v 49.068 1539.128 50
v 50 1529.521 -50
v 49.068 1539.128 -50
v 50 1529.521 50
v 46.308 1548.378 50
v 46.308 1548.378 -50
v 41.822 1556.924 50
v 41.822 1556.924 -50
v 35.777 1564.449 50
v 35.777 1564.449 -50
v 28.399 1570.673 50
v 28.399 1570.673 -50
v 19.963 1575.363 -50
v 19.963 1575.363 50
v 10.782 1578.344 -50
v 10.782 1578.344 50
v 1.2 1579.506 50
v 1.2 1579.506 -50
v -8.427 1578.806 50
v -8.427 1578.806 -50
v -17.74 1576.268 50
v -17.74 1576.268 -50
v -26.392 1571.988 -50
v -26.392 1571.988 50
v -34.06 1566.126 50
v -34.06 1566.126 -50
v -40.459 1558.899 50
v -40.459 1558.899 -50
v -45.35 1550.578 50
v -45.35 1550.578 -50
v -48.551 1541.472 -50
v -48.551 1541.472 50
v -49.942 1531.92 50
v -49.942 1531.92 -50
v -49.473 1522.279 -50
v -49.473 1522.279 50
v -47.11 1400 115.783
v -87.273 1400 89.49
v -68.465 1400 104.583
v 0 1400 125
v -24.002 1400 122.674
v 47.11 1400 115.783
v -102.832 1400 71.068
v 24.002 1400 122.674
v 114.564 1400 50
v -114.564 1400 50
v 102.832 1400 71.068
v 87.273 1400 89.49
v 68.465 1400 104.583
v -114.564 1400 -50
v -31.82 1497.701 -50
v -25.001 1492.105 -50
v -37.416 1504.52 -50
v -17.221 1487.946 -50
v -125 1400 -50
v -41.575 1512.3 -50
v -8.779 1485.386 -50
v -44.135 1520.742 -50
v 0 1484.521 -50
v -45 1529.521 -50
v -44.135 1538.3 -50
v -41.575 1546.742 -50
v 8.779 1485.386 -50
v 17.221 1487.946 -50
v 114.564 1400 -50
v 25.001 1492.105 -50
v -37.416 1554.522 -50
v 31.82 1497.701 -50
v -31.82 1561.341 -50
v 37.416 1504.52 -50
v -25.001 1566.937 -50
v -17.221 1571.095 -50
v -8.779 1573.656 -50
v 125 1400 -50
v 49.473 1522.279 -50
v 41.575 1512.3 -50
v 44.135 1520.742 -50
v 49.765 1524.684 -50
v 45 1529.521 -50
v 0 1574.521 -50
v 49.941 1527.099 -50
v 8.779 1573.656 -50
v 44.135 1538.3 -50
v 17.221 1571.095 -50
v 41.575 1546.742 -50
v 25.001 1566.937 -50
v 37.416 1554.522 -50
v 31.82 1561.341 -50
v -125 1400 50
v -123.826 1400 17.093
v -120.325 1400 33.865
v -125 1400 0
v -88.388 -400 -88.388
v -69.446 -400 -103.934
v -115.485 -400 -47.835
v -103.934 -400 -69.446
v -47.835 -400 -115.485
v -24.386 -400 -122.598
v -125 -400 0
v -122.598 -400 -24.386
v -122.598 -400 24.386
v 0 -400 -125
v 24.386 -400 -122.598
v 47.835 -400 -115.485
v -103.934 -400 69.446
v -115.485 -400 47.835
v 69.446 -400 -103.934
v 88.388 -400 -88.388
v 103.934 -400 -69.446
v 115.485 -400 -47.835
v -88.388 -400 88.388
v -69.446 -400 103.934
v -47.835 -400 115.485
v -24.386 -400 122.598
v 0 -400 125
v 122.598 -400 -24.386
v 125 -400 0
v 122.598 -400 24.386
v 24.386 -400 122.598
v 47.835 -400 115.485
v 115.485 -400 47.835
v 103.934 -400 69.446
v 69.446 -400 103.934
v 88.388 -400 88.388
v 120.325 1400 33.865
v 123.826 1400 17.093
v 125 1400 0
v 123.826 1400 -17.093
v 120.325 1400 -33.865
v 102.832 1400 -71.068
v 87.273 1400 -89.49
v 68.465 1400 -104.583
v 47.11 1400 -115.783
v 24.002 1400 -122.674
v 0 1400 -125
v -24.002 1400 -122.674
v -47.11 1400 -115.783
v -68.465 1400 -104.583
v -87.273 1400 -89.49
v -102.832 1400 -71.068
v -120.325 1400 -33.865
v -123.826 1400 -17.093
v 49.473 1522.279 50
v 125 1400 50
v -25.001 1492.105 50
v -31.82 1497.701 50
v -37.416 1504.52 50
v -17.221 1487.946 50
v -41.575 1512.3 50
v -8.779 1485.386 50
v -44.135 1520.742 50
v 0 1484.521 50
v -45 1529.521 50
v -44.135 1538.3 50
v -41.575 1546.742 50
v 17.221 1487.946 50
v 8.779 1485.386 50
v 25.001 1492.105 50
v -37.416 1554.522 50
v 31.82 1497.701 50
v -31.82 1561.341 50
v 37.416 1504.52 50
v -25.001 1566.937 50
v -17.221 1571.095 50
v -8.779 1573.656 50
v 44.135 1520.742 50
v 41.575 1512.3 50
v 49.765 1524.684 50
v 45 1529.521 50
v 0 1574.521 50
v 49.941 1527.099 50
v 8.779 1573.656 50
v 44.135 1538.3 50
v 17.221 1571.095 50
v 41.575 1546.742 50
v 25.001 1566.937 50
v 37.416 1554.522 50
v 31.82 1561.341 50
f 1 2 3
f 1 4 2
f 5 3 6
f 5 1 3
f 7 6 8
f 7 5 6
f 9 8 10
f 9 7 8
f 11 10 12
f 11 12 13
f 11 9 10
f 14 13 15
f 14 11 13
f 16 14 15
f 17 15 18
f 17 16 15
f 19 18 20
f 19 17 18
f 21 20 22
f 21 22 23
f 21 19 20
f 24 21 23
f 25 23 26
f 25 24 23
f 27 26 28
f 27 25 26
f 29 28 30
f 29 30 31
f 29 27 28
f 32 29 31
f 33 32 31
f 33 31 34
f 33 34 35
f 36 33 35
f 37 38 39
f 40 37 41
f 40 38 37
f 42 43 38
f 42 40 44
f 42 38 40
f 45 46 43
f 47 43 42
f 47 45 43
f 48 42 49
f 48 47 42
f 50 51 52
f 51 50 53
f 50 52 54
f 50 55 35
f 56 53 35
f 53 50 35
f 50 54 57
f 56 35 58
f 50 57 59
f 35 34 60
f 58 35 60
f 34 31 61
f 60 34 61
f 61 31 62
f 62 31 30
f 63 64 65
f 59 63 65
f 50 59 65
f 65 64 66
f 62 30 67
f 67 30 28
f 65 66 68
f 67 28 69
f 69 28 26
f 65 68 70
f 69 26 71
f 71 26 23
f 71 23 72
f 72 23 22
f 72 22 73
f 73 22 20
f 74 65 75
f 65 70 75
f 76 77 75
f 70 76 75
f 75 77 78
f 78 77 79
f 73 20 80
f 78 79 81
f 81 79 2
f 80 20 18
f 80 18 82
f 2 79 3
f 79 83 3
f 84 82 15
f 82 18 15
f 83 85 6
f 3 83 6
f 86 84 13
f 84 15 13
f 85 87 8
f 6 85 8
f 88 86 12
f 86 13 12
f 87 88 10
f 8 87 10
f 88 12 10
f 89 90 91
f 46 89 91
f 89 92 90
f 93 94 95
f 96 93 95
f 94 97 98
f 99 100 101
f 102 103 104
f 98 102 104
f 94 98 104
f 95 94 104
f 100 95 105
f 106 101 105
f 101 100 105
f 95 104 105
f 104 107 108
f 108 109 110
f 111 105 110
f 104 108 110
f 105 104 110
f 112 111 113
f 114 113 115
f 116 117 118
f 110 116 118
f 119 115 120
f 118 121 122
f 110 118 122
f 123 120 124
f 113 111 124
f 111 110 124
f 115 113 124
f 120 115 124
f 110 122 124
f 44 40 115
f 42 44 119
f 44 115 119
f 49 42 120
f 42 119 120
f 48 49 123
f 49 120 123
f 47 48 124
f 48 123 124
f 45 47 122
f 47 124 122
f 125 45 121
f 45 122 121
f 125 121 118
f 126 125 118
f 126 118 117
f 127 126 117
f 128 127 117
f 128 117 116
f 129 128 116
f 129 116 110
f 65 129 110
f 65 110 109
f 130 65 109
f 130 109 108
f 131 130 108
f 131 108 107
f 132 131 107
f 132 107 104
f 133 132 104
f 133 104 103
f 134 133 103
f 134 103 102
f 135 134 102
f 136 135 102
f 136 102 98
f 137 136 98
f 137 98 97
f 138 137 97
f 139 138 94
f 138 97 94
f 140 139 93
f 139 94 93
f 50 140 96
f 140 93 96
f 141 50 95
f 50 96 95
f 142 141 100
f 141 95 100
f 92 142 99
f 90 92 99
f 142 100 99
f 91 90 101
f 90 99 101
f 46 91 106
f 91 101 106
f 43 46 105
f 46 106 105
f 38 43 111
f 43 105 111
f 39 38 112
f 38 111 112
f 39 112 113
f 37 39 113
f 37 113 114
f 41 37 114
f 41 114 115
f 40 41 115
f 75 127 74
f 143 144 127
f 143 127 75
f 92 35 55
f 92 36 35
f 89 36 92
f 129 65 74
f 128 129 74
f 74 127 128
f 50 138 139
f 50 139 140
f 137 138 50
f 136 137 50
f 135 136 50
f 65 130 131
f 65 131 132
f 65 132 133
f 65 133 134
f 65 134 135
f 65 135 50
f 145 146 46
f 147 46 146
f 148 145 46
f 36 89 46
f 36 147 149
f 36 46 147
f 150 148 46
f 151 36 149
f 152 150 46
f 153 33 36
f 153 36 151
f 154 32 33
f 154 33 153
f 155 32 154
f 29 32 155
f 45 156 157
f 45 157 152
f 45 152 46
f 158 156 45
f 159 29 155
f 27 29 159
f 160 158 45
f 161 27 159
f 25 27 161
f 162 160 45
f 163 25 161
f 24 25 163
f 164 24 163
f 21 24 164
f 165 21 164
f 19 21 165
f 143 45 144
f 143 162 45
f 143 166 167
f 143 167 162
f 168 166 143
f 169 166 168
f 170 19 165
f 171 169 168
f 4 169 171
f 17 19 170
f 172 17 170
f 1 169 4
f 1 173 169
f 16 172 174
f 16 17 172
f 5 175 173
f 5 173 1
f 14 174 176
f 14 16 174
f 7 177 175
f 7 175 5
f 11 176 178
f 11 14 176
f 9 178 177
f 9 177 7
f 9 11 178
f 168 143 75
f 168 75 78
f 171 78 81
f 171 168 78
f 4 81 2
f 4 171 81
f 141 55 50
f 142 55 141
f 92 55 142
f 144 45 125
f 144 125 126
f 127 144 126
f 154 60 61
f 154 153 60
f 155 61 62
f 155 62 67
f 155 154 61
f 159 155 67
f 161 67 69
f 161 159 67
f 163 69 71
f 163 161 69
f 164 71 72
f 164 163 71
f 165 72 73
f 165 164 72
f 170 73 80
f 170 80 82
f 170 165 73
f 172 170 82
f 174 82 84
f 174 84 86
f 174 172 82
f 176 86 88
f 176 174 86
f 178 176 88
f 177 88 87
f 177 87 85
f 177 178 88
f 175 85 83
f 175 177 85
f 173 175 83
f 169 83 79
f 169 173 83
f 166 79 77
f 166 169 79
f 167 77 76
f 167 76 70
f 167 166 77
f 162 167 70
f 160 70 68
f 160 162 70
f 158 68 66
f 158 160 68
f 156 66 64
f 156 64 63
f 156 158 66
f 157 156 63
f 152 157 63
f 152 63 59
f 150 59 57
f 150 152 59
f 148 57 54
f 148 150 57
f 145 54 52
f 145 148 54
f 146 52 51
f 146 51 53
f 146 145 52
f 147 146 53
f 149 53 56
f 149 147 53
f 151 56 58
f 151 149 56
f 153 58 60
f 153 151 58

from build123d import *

# Parameters (mm, degrees)
BOSS_EXTRUDE1_DEPTH      = 1400
BOSS_EXTRUDE1_DEPTH_BACK = 400
SKETCH1_R                = 125
BOSS_EXTRUDE2_DEPTH      = 50


with BuildPart() as part:
    # Sketch1 → Boss-Extrude1 (new, two sides: drawn at the far end of the back side and taken through both)
    with BuildSketch(Plane(origin=(0, 0, 0), x_dir=(1, 0, 0), z_dir=(0, 1, 0)).offset(-BOSS_EXTRUDE1_DEPTH_BACK)):
        with Locations(Location((0, 0, 0), (0, 0, 270))):
            Circle(SKETCH1_R)
    extrude(amount=BOSS_EXTRUDE1_DEPTH + BOSS_EXTRUDE1_DEPTH_BACK)

    # Sketch2 → Boss-Extrude2 (add, symmetric)
    with BuildSketch(Plane.XY):
        with BuildLine():
            ThreePointArc((49.472820857, 1522.279340233), (0, 1479.520886781), (-49.472820857, 1522.279340233))
            Line((-49.472820857, 1522.279340233), (-125, 1400))
            Line((-125, 1400), (125, 1400))
            Line((125, 1400), (49.472820857, 1522.279340233))
        make_face()
        with BuildLine():
            ThreePointArc((45, 1529.520886781), (0, 1484.520886781), (-45, 1529.520886781))
            Line((-45, 1529.520886781), (-49.472820857, 1522.279340233))
            ThreePointArc((-49.472820857, 1522.279340233), (0, 1479.520886781), (49.472820857, 1522.279340233))
            Line((49.472820857, 1522.279340233), (45, 1529.520886781))
        make_face()
        with BuildLine():
            Line((-49.472820857, 1522.279340233), (-45, 1529.520886781))
            ThreePointArc((-45, 1529.520886781), (0, 1574.520886781), (45, 1529.520886781))
            Line((45, 1529.520886781), (49.472820857, 1522.279340233))
            ThreePointArc((49.472820857, 1522.279340233), (49.868031056, 1525.890531625), (50, 1529.520886781))
            ThreePointArc((50, 1529.520886781), (-3.630355157, 1579.388917838), (-49.472820857, 1522.279340233))
        make_face()
    extrude(amount=BOSS_EXTRUDE2_DEPTH, both=True)


solid = part.part
